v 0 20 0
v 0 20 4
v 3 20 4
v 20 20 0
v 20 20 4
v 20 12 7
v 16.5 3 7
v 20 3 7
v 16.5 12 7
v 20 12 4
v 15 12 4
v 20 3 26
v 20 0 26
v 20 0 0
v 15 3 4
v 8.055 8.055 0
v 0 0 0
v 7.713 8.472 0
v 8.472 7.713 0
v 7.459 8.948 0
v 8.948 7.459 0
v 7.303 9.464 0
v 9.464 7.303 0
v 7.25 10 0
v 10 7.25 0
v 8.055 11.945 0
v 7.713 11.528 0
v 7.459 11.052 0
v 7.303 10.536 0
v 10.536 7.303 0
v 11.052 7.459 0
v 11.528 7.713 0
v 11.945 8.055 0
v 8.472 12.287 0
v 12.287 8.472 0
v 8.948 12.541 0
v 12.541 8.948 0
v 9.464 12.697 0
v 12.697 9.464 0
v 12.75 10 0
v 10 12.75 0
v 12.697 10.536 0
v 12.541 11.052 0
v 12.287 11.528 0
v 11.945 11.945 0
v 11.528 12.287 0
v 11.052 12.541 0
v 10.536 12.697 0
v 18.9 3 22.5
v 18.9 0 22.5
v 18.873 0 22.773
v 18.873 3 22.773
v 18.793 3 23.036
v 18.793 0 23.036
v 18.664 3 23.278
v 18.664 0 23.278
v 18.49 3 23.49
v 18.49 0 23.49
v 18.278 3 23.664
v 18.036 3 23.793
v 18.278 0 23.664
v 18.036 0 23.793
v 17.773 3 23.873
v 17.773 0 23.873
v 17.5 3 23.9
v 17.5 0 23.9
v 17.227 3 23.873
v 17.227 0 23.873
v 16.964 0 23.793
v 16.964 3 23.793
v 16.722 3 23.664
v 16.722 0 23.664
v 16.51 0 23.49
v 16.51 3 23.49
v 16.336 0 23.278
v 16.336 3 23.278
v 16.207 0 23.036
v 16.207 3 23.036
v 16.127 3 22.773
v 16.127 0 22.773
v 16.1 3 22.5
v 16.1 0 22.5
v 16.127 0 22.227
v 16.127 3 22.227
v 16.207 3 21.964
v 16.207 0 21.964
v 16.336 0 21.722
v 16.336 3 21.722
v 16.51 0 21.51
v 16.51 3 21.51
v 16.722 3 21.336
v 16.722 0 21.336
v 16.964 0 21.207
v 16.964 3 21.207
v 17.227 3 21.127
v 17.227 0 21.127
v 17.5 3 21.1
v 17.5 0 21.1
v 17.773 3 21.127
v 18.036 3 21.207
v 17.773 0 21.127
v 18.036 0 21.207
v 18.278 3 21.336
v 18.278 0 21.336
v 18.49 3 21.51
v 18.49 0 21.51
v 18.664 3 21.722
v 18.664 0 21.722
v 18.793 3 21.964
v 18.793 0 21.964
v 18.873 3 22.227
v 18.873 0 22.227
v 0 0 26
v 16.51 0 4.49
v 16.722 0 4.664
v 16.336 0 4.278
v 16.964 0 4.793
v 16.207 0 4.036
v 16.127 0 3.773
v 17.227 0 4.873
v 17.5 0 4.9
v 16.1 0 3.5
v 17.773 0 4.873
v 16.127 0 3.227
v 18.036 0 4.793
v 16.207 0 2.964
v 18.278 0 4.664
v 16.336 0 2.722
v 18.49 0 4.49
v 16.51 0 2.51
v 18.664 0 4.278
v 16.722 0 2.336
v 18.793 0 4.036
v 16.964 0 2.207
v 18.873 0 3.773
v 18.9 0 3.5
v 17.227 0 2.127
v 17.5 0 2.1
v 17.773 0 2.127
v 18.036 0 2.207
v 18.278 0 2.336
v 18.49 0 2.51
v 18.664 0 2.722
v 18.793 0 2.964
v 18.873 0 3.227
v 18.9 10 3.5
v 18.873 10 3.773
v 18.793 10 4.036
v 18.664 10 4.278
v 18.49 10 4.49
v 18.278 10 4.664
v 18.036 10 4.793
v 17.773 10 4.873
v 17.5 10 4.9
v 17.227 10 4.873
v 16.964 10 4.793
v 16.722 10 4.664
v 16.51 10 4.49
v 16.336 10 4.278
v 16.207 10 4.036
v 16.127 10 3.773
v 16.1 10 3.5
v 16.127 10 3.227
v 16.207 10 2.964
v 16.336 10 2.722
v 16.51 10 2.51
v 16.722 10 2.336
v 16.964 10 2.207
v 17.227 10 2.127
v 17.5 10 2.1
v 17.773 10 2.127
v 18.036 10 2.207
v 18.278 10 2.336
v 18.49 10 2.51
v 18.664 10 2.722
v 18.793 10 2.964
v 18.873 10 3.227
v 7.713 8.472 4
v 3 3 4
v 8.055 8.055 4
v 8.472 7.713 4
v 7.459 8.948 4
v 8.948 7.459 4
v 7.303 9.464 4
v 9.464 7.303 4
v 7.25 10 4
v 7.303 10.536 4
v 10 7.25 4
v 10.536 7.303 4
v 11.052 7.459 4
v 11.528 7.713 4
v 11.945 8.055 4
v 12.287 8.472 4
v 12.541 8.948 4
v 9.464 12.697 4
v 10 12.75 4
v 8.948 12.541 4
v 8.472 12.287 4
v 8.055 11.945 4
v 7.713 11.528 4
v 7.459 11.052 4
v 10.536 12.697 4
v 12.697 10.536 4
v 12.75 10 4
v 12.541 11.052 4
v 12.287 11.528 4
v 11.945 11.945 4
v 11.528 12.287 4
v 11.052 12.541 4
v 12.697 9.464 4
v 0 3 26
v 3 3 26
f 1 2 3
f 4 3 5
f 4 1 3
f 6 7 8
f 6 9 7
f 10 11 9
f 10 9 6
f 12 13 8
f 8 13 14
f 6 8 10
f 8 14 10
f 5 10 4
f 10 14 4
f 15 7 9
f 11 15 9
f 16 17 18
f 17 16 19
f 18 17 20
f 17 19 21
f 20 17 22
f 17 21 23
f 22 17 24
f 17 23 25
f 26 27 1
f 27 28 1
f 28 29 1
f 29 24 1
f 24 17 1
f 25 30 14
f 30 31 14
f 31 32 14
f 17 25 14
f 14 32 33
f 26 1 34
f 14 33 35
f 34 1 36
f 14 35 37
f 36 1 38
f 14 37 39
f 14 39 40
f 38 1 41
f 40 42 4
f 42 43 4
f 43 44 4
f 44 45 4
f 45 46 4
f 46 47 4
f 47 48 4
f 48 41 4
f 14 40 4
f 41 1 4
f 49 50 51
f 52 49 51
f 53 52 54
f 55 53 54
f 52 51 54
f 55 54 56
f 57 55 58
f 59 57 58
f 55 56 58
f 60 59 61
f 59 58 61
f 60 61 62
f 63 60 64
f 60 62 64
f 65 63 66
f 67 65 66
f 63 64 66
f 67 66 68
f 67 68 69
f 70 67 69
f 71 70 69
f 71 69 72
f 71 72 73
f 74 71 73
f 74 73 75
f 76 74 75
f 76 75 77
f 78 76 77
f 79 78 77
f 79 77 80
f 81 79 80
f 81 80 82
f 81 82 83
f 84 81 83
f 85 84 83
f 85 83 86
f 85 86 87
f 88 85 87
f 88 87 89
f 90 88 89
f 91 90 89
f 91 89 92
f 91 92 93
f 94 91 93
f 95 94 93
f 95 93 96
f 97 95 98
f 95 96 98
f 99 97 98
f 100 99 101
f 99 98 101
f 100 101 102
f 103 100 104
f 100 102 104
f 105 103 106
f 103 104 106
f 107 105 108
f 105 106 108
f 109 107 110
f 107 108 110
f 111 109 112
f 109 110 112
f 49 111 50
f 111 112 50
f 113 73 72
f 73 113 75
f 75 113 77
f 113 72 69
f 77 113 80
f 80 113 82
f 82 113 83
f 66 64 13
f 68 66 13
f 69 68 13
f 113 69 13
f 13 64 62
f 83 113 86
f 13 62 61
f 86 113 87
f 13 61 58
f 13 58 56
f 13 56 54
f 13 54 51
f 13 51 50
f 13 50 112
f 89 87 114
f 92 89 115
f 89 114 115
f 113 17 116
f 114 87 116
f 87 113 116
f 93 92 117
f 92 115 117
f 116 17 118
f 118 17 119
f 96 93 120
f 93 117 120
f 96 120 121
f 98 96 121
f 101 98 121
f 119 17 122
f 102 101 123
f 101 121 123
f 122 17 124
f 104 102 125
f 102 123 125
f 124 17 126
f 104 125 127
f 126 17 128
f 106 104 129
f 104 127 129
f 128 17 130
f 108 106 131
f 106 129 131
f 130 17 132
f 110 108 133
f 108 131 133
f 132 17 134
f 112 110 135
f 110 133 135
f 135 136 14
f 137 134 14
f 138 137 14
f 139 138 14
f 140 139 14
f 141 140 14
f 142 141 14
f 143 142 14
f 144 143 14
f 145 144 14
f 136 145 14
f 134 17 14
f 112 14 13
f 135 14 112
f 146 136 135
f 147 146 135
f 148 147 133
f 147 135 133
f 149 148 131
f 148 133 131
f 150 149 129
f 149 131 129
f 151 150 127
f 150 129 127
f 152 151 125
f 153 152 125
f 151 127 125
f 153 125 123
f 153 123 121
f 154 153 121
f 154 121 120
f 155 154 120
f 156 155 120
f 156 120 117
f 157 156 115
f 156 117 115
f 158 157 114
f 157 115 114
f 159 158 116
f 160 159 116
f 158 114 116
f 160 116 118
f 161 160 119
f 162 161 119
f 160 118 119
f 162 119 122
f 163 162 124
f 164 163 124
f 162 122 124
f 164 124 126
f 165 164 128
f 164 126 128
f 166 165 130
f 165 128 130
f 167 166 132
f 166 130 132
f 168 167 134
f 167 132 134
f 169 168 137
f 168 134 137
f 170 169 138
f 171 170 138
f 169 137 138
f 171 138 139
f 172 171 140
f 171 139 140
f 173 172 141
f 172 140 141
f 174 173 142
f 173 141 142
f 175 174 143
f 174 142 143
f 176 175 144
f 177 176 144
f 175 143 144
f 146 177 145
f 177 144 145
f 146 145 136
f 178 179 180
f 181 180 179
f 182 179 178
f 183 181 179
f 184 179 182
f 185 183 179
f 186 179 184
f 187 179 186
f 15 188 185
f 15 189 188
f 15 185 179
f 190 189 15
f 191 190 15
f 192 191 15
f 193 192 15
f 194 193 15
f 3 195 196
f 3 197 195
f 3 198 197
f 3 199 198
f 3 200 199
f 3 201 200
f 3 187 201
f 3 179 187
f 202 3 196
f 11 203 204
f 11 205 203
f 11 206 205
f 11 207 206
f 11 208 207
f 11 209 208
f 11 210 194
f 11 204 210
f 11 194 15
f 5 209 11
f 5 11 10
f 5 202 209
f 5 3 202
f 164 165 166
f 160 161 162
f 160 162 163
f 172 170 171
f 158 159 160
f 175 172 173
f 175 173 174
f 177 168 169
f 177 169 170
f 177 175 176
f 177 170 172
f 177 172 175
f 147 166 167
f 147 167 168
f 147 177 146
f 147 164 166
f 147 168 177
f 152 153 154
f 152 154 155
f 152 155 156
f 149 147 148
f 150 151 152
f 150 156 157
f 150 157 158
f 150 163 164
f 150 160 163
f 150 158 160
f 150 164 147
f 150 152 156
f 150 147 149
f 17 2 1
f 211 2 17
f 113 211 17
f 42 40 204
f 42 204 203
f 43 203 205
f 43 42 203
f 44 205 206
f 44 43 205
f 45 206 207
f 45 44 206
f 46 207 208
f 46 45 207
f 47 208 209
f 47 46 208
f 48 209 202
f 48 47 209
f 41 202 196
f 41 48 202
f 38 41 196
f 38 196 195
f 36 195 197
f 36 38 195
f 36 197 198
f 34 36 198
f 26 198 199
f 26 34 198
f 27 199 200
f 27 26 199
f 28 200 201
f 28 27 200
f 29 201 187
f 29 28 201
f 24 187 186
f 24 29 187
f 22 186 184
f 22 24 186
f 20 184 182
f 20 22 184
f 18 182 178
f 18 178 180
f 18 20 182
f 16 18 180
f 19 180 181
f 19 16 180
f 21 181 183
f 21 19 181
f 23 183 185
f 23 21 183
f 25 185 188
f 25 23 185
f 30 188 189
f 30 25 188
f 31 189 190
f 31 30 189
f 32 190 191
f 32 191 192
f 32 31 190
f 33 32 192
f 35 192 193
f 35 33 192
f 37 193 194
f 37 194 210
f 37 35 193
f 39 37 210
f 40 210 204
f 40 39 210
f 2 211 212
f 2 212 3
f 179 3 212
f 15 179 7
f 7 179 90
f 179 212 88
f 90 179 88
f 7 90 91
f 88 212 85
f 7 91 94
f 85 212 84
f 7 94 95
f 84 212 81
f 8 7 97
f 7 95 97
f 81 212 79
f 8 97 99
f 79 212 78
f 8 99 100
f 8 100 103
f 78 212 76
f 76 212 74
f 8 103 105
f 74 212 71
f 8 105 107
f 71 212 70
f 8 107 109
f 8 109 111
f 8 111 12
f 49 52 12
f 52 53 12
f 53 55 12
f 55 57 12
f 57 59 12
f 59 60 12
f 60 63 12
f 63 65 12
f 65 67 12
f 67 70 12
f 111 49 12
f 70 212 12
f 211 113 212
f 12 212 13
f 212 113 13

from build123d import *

# Parameters (mm, degrees)
F0_W      = 20
F0_H      = 20
F0_R      = 2.75
F1_DEPTH  = 4
F2_W      = 20
F2_H      = 26
F3_DEPTH  = 3
F5_W      = 5
F5_H      = 9
F6_DEPTH  = 3
F4_R      = 1.4
F7_DEPTH  = 10
F9_DEPTH  = 3
F10_SIZE2 = 1.49999
F10_SIZE  = 2.99999


# Not quite as in the source:
# - a fillet or chamfer is up to 0.001 mm smaller than in the source, because OpenCascade refuses the exact size


with BuildPart() as f1:
    # F0 (on Top) → F1 (new body)
    with BuildSketch(Plane.XY):
        with Locations((10, 10)):
            Rectangle(F0_W, F0_H)
        with Locations((10, 10)):
            Circle(F0_R, mode=Mode.SUBTRACT)
    extrude(amount=F1_DEPTH)

    # F2 (on face) → F3 (join)
    with BuildSketch(Plane.XZ):
        with Locations((10, 13)):
            Rectangle(F2_W, F2_H)
    extrude(amount=-F3_DEPTH)

    # F5 (on face) → F6 (join)
    with BuildSketch(Plane.XY.offset(4)):
        with Locations((17.5, 7.5)):
            Rectangle(F5_W, F5_H)
    extrude(amount=F6_DEPTH)

    # F4 (on face) → F7 (cut)
    with BuildSketch(Plane.XZ):
        with Locations((17.5, 3.5)):
            Circle(F4_R)
        with Locations((17.5, 22.5)):
            Circle(F4_R)
    extrude(amount=-F7_DEPTH, mode=Mode.SUBTRACT)

    # F8 (on face) → F9 (join)
    with BuildSketch(Plane(origin=(0, 0, 0), x_dir=(0, -1, 0), z_dir=(-1, 0, 0))):
        Polygon((-3, 4), (-3, 26), (-20, 4), align=None)
    extrude(amount=-F9_DEPTH)

    # F10 (size 3 and 1.5 in the source; OpenCascade refuses exactly that, so slightly less here)
    f10_edges = [f1.edges().sort_by_distance(p)[0] for p in [
        (15, 7.5, 7),
    ]]
    f10_side = f1.faces().sort_by_distance((15, 7.5, 5.5))[0]
    chamfer(f10_edges, length=F10_SIZE, length2=F10_SIZE2, reference=f10_side)


solid = f1.part
